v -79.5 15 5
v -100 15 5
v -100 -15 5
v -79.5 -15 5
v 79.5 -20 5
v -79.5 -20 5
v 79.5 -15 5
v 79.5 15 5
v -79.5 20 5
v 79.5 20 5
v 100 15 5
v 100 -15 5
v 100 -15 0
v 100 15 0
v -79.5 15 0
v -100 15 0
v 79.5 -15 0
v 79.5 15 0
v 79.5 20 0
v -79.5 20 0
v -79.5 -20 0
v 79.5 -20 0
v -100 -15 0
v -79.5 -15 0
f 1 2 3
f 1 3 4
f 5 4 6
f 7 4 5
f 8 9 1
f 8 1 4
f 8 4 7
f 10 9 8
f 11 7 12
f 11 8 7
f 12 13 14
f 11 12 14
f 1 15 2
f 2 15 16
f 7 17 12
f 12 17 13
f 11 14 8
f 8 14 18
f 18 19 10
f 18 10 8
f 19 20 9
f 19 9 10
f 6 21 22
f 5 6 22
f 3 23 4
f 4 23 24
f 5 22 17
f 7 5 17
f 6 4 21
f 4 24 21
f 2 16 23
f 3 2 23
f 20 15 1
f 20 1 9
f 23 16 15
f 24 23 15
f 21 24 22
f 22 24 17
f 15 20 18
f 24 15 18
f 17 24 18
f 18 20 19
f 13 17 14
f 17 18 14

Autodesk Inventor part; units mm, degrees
ref_plane "YZ Plane" through (0, 0, 0) normal (1, 0, 0) x (0, 1, 0)
ref_plane "XZ Plane" through (0, 0, 0) normal (0, 1, 0) x (-1, 0, 0)
ref_plane "XY Plane" through (0, 0, 0) normal (0, 0, 1) x (1, 0, 0)
sketch "Sketch1" plane through (0, 0, 0) normal (0, 0, 1) x (1, 0, 0)
  line L0 (-100, -15) -> (100, -15)
  line L1 (100, -15) -> (100, 15)
  line L2 (100, 15) -> (-100, 15)
  line L3 (-100, 15) -> (-100, -15)
  line L4 (-100, -15) -> (100, 15) construction
  line L5 (100, -15) -> (-100, 15) construction
  line L6 (-79.5, 20) -> (79.5, 20)
  line L7 (79.5, 20) -> (79.5, 15)
  line L8 (79.5, 15) -> (-79.5, 15)
  line L9 (-79.5, 15) -> (-79.5, 20)
  line L10 (-79.5, 20) -> (79.5, 15) construction
  line L11 (79.5, 20) -> (-79.5, 15) construction
  line L12 (-100, 0) -> (100, 0)
  line L13 (-79.5, -20) -> (79.5, -20)
  line L14 (79.5, -20) -> (79.5, -15)
  line L15 (79.5, -15) -> (-79.5, -15)
  line L16 (-79.5, -15) -> (-79.5, -20)
  line L17 (-79.5, -20) -> (79.5, -15) construction
  line L18 (79.5, -20) -> (-79.5, -15) construction
  point P0 (0, 0)
  point P1 (0, 17.5)
  point P2 (0, 15)
  point P3 (0, -17.5)
  point P4 (0, -15)
  dimension "d0" = 5
  dimension "d1" = 30
  dimension "d2" = 200
  dimension "d3" = 159
extrude "Plate1" add sketch "Sketch1" along normal blind 5
equation "\"d4\" = Thickness"
equation "\"BendRadius\" = Thickness"
equation "\"BendReliefWidth\" = Thickness"
equation "\"BendReliefDepth\" = 0.5 * Thickness"
equation "\"TransitionRadius\" = BendRadius"
equation "\"JacobiRadiusSize\" = BendRadius"
equation "\"GapSize\" = Thickness"
equation "\"Thickness\" = 5"
properties part number "Base Leg V1"
